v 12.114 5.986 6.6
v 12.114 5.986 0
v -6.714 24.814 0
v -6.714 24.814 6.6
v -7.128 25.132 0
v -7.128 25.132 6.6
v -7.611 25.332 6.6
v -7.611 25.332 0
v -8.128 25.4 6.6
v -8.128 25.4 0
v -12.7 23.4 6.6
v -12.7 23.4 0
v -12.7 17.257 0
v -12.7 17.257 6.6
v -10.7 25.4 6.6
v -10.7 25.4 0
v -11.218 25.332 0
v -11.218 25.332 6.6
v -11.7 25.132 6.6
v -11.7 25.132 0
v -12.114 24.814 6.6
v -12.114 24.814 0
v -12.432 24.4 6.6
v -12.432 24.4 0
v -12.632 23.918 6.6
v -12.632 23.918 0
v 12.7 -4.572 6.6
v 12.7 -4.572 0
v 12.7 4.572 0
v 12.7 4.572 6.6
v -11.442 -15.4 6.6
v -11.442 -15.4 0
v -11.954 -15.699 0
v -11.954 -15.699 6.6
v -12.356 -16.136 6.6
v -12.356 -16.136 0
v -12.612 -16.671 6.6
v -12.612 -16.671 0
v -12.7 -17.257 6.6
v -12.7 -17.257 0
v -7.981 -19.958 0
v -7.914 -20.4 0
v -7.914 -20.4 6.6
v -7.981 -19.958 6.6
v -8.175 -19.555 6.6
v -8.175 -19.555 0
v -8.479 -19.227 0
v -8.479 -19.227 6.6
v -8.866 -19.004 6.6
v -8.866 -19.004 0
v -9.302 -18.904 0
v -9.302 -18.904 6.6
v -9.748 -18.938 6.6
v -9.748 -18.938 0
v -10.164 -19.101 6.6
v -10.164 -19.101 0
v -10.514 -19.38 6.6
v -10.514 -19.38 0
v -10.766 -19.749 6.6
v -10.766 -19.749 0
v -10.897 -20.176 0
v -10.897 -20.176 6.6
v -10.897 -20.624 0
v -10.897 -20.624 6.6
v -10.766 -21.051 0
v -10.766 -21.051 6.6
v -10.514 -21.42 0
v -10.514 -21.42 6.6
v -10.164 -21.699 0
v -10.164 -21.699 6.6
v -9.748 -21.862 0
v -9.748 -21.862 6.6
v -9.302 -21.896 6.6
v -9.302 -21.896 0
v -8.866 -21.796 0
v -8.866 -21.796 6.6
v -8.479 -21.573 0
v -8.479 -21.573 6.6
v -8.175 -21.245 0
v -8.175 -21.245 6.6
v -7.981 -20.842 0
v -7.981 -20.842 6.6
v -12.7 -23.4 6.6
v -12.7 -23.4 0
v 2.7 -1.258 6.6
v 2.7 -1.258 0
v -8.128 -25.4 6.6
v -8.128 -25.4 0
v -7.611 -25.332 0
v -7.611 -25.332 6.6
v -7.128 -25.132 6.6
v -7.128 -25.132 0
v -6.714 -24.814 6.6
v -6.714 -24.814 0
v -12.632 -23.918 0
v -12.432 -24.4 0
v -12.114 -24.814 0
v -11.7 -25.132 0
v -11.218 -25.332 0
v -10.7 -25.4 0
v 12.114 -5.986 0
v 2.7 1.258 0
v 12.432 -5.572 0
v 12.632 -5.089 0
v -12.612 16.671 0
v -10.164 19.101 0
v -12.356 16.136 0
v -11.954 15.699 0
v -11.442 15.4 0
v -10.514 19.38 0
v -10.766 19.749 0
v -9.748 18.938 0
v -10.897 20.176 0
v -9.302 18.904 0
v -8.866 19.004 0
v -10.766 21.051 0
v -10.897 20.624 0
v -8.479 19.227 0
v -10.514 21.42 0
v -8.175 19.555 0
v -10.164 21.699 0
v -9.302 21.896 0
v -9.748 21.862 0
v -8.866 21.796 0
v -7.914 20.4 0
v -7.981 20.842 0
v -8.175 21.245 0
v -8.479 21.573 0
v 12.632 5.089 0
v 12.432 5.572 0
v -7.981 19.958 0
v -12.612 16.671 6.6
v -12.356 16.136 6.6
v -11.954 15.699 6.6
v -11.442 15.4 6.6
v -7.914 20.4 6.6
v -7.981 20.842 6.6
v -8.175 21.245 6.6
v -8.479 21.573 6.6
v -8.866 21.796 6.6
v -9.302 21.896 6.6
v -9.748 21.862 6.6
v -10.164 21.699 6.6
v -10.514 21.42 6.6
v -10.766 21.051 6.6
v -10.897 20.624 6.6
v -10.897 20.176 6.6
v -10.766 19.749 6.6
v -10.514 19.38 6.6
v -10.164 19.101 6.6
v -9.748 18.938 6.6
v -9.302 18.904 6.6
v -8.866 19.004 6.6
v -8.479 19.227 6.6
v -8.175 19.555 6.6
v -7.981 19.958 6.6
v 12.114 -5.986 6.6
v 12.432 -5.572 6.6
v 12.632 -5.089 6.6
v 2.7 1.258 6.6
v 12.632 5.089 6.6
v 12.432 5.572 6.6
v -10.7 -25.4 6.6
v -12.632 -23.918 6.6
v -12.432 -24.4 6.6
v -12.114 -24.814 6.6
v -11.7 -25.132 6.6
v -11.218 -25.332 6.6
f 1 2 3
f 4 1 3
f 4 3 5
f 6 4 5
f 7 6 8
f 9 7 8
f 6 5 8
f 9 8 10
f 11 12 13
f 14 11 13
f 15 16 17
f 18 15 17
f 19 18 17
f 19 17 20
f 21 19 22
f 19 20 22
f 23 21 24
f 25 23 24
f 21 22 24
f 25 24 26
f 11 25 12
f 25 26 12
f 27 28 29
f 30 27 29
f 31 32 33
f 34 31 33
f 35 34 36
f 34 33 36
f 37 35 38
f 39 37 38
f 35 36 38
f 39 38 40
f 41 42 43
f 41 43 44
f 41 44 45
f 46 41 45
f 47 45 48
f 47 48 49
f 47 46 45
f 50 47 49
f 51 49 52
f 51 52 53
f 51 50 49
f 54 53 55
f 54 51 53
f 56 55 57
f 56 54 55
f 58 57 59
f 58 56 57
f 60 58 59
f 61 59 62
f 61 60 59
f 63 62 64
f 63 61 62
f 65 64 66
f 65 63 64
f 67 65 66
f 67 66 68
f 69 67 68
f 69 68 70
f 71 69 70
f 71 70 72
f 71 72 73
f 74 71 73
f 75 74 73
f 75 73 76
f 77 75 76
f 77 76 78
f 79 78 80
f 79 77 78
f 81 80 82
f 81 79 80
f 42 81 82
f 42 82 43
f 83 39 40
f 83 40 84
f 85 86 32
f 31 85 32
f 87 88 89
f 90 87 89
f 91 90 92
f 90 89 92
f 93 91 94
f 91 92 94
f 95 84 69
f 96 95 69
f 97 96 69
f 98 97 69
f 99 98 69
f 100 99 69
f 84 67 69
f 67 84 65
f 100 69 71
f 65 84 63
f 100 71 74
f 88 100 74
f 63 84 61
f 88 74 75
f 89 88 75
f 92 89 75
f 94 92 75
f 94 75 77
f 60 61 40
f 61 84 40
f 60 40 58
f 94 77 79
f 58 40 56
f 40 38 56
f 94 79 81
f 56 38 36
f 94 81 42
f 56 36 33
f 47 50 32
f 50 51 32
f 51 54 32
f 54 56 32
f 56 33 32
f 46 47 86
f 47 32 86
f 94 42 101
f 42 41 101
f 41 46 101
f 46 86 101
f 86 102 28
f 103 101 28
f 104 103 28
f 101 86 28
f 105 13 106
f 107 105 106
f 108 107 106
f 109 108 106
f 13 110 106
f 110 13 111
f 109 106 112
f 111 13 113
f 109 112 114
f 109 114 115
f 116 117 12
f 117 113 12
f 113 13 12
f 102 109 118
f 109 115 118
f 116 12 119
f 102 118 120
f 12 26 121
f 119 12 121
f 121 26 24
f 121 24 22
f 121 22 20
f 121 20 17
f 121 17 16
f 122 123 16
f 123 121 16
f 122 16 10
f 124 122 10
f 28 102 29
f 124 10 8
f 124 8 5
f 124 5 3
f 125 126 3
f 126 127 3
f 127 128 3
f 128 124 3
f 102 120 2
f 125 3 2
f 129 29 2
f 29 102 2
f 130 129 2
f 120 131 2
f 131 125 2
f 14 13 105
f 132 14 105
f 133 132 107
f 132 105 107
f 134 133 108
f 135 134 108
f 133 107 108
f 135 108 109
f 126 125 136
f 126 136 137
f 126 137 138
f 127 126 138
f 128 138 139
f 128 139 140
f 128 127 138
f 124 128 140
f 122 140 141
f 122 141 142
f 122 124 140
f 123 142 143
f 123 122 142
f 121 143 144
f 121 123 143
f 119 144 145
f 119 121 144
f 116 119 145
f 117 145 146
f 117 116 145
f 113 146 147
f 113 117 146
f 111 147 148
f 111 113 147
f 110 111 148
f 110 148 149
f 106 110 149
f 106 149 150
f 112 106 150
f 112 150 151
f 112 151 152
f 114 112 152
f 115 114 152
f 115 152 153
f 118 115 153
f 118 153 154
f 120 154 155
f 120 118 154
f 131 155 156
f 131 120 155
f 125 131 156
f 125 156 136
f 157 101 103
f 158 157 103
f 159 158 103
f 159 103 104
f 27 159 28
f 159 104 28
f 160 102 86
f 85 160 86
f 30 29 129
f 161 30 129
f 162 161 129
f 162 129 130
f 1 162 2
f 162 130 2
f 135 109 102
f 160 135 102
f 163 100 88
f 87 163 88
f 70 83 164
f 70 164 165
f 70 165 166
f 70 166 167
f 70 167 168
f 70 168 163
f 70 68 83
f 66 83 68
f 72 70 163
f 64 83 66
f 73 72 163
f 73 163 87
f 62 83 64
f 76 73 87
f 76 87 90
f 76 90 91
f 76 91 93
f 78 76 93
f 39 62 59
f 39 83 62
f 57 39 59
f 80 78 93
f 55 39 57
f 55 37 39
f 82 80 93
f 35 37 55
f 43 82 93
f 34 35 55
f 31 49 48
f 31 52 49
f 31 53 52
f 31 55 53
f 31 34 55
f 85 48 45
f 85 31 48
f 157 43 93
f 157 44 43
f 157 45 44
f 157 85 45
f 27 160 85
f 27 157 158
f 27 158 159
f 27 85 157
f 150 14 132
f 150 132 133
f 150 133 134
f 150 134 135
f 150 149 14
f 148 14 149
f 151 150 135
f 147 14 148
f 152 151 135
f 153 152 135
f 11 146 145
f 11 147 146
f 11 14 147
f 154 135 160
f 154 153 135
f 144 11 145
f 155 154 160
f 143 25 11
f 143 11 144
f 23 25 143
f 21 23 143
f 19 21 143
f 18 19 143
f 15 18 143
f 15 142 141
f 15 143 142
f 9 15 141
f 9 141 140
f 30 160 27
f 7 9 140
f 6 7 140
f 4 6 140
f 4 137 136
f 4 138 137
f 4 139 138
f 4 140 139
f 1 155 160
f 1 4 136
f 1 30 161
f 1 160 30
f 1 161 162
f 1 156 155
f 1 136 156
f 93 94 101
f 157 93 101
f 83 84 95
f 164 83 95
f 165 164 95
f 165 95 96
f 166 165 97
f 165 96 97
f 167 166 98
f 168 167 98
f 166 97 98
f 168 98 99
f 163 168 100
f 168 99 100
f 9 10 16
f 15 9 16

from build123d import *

# Parameters (mm, degrees)
MODEL_R             = 1.5
BOSS_EXTRUDE1_DEPTH = 6.6


with BuildPart() as part:
    # Model → Boss-Extrude1 (new body)
    with BuildSketch(Plane.XY):
        with BuildLine():
            Line((12.114213562, 5.985786438), (-6.714213562, 24.814213562))
            ThreePointArc((-6.714213562, 24.814213562), (-7.36306026, 25.247759065), (-8.128427125, 25.4))
            Line((-8.128427125, 25.4), (-10.7, 25.4))
            ThreePointArc((-10.7, 25.4), (-12.114213562, 24.814213562), (-12.7, 23.4))
            Line((-12.7, 23.4), (-12.7, 17.257211543))
            ThreePointArc((-12.7, 17.257211543), (-12.355939499, 16.135666013), (-11.442135624, 15.4))
            Line((-11.442135624, 15.4), (2.7, 1.257864376))
            Line((2.7, 1.257864376), (2.7, -1.257864376))
            Line((2.7, -1.257864376), (-11.442135624, -15.4))
            ThreePointArc((-11.442135624, -15.4), (-12.355939499, -16.135666013), (-12.7, -17.257211543))
            Line((-12.7, -17.257211543), (-12.7, -23.4))
            ThreePointArc((-12.7, -23.4), (-12.114213562, -24.814213562), (-10.7, -25.4))
            Line((-10.7, -25.4), (-8.128427125, -25.4))
            ThreePointArc((-8.128427125, -25.4), (-7.36306026, -25.247759065), (-6.714213562, -24.814213562))
            Line((-6.714213562, -24.814213562), (12.114213562, -5.985786438))
            ThreePointArc((12.114213562, -5.985786438), (12.547759065, -5.33693974), (12.7, -4.571572875))
            Line((12.7, -4.571572875), (12.7, 4.571572875))
            ThreePointArc((12.7, 4.571572875), (12.547759065, 5.33693974), (12.114213562, 5.985786438))
        make_face()
        with Locations((-9.414213562, 20.4)):
            Circle(MODEL_R, mode=Mode.SUBTRACT)
        with Locations((-9.414213562, -20.4)):
            Circle(MODEL_R, mode=Mode.SUBTRACT)
    extrude(amount=BOSS_EXTRUDE1_DEPTH)


solid = part.part
